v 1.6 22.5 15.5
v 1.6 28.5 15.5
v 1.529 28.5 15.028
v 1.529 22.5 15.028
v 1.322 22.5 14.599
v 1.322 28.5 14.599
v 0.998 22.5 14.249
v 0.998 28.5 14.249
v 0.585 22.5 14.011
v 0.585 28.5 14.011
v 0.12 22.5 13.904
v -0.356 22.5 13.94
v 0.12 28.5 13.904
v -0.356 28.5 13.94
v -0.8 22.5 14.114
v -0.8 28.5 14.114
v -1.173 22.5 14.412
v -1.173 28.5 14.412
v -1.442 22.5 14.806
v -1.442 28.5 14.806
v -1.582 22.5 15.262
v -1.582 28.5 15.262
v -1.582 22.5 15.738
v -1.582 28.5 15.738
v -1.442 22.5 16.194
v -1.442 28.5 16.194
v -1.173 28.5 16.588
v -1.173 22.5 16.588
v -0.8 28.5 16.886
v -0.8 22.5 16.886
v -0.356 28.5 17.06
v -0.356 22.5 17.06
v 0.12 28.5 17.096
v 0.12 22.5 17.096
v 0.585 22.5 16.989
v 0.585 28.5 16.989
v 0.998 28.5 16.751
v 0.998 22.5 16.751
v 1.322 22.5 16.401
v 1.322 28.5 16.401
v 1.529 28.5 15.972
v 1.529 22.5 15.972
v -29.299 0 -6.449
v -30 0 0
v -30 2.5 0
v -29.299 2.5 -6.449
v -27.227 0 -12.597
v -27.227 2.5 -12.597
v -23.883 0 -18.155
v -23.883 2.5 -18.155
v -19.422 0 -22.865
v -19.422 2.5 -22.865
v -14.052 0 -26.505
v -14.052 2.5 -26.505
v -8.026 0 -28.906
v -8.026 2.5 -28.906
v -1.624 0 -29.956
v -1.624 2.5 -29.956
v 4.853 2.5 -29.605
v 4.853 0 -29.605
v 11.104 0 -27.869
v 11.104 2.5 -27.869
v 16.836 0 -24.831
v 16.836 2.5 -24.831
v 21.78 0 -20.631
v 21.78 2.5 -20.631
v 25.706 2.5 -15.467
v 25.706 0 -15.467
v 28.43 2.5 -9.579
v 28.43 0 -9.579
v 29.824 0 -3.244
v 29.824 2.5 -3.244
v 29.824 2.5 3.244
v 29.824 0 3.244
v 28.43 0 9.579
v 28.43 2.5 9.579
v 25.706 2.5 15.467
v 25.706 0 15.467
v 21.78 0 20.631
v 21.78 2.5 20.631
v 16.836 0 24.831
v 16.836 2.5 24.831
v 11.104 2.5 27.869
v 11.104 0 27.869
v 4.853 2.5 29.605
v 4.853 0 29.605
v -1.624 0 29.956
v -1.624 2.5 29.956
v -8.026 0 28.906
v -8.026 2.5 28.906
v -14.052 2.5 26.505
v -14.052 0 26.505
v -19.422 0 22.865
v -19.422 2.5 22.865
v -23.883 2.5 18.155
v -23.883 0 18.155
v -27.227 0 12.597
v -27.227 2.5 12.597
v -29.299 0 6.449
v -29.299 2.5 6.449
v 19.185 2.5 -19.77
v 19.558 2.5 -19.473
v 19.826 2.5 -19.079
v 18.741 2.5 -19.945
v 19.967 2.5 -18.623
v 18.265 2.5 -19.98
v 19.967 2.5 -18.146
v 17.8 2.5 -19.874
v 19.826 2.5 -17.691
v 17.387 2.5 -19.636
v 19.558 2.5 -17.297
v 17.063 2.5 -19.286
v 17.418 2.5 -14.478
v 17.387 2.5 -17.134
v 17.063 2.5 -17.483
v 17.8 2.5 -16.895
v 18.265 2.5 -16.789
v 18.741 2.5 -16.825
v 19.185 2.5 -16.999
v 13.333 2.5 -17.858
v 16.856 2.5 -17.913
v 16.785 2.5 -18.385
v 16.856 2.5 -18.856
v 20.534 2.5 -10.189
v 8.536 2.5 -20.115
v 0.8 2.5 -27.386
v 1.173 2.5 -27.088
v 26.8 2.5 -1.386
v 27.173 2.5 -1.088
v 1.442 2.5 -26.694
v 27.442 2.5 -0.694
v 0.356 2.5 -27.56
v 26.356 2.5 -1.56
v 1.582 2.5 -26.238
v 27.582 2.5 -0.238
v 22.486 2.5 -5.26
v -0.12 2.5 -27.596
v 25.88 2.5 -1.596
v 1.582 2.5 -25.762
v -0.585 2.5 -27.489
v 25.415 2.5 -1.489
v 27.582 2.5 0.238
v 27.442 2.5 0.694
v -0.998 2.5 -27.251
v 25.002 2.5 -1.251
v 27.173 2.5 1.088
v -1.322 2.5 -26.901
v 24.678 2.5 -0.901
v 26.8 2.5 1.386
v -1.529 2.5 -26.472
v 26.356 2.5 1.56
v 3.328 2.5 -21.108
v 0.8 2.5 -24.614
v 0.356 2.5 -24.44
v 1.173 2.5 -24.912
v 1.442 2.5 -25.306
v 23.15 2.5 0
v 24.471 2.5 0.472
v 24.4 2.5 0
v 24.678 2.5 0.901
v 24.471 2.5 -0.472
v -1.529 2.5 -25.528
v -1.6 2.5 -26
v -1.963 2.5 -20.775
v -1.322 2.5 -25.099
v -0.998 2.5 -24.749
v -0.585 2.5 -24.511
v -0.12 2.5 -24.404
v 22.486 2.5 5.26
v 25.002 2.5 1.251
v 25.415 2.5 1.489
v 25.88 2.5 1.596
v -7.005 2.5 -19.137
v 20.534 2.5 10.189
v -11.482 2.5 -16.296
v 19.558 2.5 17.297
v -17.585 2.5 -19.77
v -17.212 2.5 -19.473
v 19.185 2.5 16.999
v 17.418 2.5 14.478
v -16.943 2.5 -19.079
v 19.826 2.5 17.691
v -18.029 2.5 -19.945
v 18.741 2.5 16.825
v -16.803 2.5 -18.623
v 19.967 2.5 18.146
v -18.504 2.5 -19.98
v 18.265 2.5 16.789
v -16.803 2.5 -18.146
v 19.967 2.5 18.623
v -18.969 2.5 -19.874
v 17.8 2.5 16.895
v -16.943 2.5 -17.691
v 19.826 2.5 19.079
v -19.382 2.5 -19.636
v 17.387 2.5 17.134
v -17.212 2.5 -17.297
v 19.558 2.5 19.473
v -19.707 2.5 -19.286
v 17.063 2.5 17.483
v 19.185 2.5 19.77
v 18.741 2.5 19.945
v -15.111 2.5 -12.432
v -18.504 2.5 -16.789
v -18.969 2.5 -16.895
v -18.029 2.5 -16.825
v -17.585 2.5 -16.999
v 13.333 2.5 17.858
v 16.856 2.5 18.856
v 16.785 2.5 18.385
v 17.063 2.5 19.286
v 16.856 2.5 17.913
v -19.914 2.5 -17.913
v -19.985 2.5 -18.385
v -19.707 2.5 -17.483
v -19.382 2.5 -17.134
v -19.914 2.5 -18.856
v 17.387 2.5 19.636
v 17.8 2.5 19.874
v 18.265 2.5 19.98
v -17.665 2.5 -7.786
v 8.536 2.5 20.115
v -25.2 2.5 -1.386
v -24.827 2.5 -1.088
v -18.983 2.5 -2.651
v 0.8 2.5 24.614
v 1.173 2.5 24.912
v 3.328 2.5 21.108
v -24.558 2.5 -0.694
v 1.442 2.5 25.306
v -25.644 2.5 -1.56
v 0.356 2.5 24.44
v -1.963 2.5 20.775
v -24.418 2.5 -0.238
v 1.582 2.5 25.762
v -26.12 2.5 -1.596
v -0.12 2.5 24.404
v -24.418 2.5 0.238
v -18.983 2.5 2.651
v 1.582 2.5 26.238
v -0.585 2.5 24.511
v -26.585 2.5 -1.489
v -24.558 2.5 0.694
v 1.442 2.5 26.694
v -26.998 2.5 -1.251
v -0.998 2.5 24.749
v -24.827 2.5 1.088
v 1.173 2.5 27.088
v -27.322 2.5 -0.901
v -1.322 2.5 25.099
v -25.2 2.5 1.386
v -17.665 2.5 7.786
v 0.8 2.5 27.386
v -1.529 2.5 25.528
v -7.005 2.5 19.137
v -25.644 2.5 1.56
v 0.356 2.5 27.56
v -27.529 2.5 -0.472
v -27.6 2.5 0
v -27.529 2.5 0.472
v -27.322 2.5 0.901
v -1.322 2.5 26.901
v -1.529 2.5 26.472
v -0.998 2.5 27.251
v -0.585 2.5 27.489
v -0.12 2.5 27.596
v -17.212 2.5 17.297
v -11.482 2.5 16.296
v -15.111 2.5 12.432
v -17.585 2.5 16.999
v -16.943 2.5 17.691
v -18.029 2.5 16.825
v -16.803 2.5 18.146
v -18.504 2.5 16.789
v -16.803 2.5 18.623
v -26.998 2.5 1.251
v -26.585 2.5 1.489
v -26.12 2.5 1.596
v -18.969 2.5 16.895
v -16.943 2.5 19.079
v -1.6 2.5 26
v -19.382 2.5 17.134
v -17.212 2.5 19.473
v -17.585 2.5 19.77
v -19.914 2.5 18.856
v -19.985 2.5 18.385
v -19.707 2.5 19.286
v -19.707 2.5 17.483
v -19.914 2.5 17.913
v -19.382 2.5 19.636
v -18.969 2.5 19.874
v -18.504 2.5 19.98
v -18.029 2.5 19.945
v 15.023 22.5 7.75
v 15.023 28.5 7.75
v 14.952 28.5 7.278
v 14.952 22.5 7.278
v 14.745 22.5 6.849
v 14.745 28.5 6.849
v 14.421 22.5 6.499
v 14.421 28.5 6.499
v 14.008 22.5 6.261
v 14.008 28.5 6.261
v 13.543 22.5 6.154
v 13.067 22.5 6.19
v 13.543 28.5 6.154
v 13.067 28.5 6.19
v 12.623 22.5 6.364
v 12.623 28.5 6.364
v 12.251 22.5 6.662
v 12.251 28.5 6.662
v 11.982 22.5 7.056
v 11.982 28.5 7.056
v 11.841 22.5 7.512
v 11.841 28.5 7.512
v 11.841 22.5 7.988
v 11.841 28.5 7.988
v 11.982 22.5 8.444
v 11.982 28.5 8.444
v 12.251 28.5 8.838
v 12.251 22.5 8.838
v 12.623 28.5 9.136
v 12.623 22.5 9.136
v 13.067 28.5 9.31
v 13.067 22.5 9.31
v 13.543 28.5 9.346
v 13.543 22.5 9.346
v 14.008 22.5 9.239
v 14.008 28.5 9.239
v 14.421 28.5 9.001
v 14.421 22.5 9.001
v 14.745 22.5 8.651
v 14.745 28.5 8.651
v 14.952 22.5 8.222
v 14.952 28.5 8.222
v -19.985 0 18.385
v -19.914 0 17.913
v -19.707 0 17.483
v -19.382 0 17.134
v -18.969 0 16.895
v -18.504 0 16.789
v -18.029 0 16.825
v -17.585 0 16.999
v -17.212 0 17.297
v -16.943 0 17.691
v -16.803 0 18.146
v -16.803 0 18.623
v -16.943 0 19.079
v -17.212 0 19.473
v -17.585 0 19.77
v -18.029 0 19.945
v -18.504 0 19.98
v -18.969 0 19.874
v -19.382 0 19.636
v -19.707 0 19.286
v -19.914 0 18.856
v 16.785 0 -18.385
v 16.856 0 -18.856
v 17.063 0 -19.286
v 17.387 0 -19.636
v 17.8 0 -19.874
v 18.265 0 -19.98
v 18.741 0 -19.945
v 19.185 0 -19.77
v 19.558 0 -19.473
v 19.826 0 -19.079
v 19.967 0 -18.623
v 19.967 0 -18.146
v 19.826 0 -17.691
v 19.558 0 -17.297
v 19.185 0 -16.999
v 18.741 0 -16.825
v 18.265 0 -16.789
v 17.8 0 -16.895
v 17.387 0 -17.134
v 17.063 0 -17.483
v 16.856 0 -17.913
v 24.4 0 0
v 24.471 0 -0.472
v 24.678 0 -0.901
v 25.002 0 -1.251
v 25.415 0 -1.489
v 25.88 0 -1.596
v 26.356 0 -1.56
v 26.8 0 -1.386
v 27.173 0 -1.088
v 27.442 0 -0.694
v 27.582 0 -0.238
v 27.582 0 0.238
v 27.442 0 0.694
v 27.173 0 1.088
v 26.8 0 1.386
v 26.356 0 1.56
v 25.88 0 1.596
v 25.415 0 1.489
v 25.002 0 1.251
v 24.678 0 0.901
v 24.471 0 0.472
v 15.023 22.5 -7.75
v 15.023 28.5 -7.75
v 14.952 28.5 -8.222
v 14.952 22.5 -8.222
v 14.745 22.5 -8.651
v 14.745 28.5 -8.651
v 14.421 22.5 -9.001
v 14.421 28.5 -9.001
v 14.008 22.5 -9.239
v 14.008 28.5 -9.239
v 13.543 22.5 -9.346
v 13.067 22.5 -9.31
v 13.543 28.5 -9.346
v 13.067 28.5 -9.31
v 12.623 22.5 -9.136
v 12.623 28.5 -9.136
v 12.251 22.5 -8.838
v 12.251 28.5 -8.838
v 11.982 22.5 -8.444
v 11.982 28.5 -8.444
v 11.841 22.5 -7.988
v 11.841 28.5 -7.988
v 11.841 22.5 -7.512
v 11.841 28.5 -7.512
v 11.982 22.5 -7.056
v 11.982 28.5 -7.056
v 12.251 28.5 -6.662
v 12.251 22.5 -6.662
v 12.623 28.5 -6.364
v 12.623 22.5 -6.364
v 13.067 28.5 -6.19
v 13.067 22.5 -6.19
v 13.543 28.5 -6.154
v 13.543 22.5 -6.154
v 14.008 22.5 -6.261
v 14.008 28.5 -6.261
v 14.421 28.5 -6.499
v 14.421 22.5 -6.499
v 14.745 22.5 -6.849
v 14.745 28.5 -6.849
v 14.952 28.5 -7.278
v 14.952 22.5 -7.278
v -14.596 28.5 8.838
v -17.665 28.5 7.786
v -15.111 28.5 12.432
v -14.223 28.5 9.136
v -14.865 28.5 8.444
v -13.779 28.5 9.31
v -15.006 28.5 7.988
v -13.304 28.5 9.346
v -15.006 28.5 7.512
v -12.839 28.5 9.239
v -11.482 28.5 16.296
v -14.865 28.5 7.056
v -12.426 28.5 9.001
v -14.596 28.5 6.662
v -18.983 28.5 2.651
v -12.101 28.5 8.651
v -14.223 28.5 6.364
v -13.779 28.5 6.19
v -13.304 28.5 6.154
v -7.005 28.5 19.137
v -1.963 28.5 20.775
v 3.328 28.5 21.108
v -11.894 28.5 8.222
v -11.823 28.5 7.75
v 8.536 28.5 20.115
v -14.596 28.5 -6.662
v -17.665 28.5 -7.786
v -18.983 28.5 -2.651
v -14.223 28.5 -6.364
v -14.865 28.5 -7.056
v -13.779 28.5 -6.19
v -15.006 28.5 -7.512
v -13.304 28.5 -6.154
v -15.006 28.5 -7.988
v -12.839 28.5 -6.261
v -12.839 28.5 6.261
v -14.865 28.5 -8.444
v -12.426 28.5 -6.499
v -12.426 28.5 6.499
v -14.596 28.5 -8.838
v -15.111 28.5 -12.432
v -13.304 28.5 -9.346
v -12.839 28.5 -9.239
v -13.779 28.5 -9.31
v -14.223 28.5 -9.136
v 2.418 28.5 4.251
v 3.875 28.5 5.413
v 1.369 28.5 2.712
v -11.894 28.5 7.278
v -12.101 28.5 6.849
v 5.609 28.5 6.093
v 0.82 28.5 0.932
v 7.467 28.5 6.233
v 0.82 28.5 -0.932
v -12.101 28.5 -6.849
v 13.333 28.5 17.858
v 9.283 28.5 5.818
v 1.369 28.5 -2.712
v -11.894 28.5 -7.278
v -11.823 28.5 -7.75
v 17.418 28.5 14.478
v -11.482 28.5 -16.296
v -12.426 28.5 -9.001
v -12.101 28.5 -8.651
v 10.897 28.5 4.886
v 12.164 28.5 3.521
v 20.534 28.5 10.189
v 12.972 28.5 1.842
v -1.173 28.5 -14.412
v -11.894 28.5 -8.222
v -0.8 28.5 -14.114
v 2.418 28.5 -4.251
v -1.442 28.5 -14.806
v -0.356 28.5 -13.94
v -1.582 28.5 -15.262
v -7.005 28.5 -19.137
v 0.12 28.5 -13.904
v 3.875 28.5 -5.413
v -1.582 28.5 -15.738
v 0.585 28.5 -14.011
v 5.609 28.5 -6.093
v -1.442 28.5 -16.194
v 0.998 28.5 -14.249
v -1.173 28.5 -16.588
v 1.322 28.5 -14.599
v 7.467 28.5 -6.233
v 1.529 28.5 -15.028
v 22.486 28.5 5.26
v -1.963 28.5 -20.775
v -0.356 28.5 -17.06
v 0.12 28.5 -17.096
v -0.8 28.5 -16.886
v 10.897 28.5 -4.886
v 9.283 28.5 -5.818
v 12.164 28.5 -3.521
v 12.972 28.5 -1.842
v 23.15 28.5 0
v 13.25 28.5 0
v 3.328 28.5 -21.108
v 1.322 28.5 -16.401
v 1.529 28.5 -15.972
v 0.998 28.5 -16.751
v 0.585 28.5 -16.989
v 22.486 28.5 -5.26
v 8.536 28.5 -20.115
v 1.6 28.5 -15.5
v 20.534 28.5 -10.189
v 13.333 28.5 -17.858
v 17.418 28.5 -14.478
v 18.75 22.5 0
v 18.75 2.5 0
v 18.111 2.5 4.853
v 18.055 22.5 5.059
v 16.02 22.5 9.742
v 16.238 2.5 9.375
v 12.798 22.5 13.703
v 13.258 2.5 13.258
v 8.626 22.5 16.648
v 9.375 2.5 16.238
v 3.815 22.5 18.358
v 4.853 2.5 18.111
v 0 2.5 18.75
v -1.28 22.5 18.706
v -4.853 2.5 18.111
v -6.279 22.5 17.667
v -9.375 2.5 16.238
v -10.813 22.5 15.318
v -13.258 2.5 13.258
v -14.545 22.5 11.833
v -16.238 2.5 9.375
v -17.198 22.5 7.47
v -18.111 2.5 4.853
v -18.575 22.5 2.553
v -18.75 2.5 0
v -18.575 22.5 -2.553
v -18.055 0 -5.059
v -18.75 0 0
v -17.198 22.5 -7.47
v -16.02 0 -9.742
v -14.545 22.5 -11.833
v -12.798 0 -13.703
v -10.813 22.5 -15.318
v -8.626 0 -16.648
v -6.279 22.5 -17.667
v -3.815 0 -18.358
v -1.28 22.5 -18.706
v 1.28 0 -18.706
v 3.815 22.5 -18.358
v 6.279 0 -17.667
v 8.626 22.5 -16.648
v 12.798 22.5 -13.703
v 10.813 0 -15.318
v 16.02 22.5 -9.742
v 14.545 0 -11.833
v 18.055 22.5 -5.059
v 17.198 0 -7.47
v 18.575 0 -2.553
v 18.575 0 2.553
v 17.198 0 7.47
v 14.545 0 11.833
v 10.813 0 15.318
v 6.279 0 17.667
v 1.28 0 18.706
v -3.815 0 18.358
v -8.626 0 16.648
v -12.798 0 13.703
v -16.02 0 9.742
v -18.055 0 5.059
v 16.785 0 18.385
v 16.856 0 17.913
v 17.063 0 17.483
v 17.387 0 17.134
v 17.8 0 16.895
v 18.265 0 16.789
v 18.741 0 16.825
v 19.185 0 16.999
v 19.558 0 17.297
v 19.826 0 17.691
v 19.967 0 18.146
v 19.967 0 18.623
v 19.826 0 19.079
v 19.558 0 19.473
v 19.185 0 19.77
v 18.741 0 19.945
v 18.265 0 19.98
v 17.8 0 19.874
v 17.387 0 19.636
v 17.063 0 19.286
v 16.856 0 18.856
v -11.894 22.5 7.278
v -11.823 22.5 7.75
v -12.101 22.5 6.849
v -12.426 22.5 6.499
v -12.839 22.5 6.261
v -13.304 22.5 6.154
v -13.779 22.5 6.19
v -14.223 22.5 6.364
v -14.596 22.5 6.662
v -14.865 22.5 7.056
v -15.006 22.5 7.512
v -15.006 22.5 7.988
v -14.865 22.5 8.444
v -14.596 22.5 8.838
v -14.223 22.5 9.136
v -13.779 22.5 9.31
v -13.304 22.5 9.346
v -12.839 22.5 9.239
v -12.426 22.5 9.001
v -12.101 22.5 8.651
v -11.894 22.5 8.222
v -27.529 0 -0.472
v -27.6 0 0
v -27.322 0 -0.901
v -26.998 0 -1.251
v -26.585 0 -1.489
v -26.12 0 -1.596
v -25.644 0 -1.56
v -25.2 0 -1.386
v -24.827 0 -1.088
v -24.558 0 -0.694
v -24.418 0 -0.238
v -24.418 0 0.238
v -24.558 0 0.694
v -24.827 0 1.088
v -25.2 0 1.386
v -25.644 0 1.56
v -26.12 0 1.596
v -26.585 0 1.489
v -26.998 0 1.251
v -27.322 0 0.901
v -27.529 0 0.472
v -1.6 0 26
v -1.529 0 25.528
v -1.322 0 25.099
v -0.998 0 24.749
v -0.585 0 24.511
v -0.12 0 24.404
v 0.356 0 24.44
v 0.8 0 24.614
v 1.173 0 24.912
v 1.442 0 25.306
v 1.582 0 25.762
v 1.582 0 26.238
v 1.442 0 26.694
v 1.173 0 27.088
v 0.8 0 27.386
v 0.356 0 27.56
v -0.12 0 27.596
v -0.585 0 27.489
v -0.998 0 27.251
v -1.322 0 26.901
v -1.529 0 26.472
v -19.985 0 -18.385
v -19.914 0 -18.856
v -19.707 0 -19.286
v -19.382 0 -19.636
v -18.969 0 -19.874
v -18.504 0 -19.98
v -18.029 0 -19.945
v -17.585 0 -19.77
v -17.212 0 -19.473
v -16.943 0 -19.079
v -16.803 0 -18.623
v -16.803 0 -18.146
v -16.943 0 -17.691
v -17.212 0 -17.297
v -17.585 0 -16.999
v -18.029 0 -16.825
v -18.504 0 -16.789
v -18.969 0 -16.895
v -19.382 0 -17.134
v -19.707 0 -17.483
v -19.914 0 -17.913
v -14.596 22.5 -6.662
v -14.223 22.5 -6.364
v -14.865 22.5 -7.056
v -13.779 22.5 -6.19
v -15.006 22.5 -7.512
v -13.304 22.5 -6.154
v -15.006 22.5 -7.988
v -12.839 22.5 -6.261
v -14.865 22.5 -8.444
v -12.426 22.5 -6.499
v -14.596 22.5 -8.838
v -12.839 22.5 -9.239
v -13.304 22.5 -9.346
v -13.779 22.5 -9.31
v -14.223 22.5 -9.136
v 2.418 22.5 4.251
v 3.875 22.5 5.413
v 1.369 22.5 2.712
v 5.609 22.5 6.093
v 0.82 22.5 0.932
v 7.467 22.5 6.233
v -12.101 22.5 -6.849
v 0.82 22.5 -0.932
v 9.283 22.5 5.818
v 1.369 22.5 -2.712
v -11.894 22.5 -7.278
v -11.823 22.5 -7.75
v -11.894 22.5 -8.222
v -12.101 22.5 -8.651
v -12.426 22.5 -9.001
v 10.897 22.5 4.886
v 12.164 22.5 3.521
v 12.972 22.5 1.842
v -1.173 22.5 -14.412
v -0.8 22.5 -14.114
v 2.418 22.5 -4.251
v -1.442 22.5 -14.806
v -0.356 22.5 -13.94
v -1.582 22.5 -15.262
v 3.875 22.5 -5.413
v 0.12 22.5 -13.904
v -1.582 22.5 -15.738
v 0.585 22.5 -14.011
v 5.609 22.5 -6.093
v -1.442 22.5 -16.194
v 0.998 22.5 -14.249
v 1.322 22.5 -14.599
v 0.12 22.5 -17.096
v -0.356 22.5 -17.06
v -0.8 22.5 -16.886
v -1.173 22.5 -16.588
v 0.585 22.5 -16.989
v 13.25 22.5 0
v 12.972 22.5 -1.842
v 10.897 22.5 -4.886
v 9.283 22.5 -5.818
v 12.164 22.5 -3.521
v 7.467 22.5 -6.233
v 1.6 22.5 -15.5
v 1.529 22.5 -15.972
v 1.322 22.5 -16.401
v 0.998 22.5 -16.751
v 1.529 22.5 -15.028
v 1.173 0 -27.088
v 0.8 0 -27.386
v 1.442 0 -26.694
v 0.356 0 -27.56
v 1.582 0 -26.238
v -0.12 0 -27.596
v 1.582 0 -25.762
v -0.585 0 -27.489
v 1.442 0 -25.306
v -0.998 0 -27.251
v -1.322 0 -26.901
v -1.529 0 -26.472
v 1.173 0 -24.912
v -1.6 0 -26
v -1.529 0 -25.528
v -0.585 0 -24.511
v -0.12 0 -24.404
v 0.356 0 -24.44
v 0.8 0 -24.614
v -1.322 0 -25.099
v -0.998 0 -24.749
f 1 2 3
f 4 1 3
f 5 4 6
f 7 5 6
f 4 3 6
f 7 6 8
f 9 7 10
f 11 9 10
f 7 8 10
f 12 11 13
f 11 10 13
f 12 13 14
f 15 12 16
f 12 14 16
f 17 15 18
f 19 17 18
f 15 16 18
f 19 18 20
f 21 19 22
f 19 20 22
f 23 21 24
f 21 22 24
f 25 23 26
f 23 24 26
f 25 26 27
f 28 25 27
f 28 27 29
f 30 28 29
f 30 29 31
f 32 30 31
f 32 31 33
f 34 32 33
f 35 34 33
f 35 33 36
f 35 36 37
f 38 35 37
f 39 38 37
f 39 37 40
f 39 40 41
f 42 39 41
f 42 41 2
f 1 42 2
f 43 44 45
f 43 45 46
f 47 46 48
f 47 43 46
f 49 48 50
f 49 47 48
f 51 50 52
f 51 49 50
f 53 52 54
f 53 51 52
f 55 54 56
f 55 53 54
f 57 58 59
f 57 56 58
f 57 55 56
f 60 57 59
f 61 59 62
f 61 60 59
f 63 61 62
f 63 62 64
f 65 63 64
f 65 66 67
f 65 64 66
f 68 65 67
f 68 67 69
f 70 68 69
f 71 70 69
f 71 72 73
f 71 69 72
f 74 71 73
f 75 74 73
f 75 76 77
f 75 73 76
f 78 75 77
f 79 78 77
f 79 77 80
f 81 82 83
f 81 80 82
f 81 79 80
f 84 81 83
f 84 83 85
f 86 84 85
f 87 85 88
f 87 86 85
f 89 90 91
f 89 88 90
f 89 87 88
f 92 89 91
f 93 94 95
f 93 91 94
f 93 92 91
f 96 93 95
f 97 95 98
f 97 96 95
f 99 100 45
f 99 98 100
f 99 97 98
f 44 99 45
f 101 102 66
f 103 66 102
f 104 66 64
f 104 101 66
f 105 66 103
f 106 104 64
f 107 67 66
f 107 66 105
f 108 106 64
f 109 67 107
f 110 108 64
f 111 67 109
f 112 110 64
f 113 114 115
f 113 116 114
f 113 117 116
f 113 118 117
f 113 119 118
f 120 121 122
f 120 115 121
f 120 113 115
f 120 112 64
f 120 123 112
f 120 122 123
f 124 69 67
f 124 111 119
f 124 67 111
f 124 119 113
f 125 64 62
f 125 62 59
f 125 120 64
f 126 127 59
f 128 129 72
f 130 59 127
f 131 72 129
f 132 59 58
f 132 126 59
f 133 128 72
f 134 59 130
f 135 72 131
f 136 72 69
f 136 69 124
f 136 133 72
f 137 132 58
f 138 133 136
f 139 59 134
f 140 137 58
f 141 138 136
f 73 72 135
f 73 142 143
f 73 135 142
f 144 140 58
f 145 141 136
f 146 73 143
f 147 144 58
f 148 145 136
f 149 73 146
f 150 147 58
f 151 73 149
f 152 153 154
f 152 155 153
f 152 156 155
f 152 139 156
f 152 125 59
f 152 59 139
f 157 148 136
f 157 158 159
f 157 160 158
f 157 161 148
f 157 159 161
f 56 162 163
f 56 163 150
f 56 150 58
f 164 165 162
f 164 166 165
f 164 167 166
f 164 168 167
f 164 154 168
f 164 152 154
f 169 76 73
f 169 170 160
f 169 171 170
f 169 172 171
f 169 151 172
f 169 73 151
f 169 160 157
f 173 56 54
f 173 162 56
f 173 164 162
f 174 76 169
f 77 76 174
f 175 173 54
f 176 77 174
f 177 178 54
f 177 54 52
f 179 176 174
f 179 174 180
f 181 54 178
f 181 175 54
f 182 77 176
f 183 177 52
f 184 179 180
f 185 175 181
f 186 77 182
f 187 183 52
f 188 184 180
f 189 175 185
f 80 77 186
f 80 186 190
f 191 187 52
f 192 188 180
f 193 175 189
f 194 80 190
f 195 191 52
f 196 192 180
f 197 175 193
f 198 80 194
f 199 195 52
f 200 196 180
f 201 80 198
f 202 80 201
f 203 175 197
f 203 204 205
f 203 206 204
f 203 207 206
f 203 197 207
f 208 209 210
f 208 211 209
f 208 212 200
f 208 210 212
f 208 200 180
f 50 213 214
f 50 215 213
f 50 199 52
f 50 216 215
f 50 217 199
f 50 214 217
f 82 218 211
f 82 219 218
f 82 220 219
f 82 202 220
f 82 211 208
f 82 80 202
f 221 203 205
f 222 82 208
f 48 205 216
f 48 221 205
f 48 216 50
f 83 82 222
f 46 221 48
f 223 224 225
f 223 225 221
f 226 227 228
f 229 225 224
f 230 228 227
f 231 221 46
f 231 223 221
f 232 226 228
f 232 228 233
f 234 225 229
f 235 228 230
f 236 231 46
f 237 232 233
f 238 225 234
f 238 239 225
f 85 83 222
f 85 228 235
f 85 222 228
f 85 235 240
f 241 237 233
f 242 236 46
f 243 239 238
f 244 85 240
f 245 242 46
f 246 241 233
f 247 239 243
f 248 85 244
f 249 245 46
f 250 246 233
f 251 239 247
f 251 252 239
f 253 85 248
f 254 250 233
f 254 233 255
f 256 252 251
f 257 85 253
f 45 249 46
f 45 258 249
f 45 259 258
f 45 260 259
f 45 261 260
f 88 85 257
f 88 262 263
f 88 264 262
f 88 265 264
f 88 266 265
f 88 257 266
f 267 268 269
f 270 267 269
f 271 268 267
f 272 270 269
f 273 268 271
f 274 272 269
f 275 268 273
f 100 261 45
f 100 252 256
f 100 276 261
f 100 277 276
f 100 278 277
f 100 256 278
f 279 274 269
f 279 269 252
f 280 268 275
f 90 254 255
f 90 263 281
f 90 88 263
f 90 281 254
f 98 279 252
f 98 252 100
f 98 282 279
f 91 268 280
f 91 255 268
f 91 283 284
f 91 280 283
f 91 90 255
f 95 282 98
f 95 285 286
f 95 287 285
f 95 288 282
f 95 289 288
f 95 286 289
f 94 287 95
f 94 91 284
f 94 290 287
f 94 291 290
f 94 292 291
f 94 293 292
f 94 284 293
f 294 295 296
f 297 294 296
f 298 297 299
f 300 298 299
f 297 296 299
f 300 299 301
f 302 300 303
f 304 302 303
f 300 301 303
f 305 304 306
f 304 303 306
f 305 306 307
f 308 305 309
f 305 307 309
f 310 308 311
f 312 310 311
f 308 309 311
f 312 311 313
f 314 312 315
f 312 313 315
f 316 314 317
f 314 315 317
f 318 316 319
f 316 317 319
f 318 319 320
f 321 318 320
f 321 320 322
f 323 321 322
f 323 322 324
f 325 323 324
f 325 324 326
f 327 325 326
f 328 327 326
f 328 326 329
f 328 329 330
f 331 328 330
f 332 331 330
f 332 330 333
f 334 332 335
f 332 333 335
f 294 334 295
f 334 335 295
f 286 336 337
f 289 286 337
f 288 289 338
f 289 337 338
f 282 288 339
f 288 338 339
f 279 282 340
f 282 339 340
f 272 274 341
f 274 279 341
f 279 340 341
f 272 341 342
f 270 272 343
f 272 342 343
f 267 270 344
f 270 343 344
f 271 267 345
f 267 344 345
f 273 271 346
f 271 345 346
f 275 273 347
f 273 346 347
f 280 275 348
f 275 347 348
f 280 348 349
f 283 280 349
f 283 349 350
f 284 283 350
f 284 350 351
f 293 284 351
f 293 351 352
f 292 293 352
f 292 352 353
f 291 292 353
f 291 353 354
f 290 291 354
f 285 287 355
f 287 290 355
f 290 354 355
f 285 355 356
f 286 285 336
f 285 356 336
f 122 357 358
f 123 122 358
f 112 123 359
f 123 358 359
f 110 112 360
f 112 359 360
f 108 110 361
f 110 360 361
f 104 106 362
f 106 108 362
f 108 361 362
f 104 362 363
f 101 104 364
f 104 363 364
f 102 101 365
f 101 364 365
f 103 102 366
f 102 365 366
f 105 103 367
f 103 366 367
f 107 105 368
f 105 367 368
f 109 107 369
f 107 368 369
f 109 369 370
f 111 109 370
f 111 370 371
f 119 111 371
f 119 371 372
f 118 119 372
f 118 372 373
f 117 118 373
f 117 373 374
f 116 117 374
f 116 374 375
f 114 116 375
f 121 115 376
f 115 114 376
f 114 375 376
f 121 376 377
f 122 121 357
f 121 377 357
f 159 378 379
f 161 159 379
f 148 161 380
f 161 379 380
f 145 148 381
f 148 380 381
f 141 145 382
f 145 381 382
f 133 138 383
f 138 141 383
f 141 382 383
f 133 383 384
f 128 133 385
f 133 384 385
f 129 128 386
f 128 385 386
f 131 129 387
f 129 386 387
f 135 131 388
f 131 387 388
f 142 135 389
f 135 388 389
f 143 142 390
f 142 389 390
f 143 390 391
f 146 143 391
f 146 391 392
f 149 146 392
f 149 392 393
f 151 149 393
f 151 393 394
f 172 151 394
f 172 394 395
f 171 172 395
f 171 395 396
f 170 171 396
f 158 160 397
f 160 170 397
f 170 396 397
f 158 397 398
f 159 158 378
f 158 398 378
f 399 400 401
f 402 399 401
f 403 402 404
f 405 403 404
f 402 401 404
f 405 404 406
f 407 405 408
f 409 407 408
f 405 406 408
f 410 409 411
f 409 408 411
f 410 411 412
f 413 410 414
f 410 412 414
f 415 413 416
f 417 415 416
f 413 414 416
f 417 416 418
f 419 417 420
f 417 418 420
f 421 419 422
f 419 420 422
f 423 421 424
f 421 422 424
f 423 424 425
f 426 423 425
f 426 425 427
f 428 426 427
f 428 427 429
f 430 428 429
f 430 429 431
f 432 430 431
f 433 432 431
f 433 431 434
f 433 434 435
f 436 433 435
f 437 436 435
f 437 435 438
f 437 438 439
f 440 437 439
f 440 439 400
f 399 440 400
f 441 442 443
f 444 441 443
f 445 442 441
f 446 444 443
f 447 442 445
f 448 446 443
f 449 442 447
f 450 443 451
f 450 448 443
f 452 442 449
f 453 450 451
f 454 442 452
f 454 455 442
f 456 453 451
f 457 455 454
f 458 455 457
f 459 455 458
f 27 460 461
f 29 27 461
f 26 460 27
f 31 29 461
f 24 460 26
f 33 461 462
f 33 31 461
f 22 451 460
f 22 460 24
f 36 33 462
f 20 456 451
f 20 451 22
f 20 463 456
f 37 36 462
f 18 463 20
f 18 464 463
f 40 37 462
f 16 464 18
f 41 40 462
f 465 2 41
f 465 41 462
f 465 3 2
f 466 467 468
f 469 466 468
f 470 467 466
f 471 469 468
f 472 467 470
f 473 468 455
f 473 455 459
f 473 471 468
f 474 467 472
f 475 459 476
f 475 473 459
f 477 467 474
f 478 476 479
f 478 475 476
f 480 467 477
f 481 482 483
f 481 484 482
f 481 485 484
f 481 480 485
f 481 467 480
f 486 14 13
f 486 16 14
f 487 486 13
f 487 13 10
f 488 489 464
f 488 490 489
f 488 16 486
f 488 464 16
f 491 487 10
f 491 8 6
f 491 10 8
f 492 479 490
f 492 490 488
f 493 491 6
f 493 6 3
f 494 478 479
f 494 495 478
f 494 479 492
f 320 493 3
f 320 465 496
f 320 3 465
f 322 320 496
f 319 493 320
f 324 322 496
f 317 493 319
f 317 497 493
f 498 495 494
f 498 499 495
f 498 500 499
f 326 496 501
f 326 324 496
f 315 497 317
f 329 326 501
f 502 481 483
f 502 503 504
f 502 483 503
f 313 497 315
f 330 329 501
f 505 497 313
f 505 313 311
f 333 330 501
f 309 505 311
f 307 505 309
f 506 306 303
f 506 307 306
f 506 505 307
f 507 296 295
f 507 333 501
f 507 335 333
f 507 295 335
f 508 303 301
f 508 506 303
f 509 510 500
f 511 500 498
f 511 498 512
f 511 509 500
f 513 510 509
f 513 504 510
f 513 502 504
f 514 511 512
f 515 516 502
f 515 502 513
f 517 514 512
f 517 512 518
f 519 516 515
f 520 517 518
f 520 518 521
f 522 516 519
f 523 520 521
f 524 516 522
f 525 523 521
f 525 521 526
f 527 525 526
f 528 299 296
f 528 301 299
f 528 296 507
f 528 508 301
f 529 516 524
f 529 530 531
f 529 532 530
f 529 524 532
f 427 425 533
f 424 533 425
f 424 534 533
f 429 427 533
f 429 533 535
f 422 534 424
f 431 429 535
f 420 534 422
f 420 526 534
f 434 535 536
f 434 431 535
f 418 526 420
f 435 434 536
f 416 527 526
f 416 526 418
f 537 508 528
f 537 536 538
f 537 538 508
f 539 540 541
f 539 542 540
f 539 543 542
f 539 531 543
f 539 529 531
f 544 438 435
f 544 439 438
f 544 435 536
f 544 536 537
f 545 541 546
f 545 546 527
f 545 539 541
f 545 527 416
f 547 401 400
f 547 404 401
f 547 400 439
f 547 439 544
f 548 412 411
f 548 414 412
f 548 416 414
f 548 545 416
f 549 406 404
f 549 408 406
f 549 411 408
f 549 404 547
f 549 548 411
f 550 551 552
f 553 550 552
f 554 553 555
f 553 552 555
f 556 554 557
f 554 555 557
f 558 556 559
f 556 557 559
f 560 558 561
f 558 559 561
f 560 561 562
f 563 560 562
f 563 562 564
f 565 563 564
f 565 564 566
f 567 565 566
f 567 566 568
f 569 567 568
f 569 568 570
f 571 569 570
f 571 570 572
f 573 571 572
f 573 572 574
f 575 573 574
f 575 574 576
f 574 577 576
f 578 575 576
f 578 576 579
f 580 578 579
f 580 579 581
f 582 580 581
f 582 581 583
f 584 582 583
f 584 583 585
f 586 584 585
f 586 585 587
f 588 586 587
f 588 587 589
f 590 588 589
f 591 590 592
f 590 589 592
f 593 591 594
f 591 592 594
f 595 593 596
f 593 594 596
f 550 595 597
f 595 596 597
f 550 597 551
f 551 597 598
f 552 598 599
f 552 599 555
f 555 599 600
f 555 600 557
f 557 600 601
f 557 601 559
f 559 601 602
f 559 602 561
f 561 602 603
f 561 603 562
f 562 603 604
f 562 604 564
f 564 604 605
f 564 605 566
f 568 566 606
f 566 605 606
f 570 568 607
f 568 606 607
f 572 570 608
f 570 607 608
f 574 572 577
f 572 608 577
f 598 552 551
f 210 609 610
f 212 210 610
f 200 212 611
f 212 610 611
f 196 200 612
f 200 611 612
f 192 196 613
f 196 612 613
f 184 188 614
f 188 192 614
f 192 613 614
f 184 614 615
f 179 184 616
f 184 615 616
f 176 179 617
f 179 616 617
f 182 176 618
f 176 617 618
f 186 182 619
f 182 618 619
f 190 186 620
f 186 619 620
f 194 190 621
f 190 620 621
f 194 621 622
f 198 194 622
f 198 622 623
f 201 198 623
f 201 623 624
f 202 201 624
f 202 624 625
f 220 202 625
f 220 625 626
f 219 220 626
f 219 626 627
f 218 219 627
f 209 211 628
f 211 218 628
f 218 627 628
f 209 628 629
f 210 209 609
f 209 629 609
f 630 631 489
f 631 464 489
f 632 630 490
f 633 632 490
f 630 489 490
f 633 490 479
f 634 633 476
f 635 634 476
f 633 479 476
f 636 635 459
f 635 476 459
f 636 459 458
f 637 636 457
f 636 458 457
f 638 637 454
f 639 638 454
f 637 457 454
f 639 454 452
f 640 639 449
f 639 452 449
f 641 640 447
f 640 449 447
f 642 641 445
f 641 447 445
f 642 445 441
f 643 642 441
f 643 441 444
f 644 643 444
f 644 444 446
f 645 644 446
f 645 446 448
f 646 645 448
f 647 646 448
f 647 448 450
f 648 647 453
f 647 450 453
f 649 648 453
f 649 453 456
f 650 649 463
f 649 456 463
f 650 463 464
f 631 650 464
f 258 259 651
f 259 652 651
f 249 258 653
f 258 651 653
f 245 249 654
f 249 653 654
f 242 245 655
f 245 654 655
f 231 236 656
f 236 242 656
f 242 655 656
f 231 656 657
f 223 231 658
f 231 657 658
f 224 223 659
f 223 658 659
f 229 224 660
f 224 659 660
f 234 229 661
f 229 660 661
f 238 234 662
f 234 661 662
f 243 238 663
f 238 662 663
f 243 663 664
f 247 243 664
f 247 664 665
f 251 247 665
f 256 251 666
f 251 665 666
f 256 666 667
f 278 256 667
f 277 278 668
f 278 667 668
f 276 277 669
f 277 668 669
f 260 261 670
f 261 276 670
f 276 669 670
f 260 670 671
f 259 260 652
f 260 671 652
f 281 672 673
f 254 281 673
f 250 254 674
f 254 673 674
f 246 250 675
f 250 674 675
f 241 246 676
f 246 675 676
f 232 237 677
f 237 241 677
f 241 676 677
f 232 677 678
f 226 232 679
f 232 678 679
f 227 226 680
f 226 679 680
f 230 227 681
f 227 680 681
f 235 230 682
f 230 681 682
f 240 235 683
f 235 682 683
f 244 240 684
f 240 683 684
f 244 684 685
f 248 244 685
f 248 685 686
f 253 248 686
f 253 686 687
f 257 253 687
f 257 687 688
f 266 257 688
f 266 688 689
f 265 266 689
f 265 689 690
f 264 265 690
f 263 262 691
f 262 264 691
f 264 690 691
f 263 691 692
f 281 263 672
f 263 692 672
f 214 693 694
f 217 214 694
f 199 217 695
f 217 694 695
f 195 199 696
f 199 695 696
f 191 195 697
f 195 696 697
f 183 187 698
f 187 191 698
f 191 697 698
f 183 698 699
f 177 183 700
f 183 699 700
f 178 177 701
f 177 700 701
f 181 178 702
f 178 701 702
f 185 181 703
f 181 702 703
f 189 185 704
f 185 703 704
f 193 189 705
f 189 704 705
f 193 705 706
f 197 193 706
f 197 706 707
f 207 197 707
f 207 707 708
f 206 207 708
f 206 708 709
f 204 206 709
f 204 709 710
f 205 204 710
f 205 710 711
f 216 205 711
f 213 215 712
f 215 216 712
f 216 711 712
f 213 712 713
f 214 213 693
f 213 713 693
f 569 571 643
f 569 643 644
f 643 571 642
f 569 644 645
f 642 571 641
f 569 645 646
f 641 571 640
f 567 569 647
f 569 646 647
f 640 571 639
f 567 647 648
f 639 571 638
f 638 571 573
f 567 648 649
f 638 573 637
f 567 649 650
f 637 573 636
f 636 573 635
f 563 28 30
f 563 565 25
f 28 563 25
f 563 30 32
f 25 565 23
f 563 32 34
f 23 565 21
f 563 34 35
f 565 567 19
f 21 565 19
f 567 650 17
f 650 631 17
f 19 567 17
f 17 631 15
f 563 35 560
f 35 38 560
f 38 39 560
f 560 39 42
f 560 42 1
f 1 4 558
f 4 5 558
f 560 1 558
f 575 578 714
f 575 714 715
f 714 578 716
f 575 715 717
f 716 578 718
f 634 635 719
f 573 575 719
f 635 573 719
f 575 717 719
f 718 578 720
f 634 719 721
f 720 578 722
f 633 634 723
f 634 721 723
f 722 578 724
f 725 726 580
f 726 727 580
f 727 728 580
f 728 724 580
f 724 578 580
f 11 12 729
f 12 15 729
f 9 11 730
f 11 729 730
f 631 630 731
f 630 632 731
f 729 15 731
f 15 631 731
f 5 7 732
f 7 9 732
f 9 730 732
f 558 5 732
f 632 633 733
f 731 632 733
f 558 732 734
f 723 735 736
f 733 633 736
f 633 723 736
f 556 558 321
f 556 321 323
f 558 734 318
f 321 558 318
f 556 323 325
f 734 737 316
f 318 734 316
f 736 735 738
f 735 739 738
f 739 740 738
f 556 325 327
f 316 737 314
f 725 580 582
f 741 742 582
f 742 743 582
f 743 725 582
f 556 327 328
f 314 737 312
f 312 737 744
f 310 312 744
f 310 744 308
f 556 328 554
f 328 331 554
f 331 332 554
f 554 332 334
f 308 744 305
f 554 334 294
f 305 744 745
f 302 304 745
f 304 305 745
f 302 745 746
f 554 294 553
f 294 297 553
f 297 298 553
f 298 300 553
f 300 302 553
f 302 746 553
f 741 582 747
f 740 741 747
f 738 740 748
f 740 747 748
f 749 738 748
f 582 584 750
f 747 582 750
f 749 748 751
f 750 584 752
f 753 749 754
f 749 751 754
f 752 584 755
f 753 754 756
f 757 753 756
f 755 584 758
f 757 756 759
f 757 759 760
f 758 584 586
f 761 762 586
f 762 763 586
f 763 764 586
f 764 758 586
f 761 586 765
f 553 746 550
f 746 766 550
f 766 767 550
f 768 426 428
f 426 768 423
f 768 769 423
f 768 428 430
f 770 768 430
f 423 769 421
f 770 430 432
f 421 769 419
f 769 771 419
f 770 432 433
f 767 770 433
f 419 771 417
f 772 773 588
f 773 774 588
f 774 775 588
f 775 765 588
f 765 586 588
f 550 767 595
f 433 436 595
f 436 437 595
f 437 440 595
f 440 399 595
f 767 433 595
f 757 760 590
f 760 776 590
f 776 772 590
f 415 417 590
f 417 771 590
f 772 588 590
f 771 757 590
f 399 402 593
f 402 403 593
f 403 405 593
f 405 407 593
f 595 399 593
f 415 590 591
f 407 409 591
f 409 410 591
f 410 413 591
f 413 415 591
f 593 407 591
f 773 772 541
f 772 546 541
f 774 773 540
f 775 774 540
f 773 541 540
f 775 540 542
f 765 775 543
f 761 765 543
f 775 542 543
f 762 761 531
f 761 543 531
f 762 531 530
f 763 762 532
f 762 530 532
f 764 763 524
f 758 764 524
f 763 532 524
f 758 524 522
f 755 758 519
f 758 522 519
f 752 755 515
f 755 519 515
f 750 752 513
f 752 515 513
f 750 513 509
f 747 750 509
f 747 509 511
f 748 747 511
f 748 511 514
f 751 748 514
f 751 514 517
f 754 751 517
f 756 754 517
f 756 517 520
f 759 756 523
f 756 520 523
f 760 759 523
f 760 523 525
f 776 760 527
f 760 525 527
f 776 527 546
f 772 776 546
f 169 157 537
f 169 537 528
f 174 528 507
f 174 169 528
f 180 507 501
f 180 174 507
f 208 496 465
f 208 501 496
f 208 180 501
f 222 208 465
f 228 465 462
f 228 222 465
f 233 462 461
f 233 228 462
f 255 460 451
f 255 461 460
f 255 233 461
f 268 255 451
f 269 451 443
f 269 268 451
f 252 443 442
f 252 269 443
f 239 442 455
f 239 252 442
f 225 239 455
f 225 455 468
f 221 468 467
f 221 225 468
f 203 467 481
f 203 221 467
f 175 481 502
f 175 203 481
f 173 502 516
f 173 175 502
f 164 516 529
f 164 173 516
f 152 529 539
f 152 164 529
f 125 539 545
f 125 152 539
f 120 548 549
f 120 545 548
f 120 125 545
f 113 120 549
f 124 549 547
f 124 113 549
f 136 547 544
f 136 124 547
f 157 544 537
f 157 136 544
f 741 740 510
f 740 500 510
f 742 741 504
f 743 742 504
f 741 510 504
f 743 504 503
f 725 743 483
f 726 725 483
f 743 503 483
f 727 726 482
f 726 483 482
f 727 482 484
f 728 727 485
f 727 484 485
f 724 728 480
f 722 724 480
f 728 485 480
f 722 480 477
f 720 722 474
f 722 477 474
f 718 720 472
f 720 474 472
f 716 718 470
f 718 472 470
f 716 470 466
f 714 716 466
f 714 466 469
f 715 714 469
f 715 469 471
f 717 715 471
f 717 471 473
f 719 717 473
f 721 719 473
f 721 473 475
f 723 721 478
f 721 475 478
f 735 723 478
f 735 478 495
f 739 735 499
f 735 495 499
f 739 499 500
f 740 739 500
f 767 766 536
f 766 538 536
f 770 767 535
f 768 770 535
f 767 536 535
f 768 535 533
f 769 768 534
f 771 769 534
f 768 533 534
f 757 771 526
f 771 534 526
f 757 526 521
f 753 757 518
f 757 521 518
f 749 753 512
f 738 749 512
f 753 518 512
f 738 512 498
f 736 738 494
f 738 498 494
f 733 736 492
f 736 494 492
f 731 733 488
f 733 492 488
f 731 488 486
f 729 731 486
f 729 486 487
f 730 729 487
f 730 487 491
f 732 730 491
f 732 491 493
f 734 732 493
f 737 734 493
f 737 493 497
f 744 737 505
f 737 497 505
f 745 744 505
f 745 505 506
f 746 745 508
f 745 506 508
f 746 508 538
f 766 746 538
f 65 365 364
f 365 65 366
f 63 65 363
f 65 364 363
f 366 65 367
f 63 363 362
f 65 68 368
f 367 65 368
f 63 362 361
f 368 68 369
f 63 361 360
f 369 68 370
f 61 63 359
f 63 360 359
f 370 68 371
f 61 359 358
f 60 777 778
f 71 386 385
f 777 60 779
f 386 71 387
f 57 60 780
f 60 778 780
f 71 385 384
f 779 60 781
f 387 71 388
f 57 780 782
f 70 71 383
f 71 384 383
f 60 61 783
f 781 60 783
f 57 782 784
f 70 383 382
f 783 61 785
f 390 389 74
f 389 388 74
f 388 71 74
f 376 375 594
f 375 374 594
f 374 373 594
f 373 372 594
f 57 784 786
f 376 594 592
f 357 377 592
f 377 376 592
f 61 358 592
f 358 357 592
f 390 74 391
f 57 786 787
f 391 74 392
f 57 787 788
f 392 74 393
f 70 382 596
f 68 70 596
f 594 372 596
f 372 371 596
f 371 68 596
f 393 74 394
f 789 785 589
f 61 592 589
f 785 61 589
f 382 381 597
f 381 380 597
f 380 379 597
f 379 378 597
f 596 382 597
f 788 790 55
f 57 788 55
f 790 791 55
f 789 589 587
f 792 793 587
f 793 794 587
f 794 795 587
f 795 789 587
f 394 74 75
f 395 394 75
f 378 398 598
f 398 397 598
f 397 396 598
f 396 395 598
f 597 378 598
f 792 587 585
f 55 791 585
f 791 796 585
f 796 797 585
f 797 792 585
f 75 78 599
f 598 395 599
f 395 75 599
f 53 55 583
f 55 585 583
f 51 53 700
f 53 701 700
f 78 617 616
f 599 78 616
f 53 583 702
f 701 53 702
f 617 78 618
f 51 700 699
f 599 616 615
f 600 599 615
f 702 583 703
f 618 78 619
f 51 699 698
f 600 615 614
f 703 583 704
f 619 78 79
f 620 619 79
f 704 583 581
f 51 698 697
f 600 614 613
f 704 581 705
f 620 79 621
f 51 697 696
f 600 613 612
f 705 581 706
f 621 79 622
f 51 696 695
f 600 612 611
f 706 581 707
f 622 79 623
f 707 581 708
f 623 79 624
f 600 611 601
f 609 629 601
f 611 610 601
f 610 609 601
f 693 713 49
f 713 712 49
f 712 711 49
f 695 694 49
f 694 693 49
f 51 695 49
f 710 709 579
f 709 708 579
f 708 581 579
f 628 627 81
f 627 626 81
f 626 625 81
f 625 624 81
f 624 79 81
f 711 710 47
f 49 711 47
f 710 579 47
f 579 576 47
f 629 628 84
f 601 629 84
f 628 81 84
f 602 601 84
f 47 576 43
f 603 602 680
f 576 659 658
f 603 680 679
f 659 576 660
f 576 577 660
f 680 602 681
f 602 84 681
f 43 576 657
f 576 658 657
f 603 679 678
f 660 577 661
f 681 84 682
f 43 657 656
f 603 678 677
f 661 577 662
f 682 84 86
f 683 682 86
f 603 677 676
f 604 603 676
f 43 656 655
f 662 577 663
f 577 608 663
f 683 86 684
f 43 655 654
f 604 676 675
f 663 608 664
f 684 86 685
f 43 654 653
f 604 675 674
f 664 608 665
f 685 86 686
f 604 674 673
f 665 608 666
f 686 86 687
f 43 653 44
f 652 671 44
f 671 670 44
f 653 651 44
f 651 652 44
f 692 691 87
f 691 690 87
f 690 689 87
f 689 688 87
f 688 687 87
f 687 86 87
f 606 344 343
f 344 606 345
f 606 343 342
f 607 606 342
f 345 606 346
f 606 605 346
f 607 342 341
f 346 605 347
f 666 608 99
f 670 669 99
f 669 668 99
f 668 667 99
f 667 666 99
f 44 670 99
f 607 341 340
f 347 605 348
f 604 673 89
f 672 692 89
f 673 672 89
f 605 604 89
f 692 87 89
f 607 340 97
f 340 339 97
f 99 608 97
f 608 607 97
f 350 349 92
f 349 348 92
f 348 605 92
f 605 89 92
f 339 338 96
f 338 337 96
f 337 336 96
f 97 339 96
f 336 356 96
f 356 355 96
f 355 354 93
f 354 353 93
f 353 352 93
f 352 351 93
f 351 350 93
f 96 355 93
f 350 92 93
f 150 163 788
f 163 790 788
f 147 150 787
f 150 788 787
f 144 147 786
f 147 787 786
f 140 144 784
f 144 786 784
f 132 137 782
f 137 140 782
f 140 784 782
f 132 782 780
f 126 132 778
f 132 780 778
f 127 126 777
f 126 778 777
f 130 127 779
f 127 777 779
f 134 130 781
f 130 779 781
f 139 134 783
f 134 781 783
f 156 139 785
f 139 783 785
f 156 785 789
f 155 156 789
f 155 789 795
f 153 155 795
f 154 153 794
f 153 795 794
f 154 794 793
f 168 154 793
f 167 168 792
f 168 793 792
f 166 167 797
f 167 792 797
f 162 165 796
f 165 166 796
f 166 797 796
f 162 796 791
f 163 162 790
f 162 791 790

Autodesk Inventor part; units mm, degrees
ref_plane "YZ Plane" through (0, 0, 0) normal (1, 0, 0) x (0, 1, 0)
ref_plane "XZ Plane" through (0, 0, 0) normal (0, 1, 0) x (-1, 0, 0)
ref_plane "XY Plane" through (0, 0, 0) normal (0, 0, 1) x (1, 0, 0)
sketch "Sketch2" plane through (0, 0, 0) normal (0, 1, 0) x (-1, 0, 0)
  circle A0 centre (0, 0) radius 18.75
  circle A1 centre (0, 0) radius 30
  circle A2 centre (26, 0) radius 1.6
  circle A3 centre (18.3848, -18.3848) radius 1.6
  circle A4 centre (0, -26) radius 1.6
  circle A5 centre (-18.3848, -18.3848) radius 1.6
  circle A6 centre (-26, 0) radius 1.6
  circle A7 centre (-18.3848, 18.3848) radius 1.6
  circle A8 centre (0, 26) radius 1.6
  circle A9 centre (18.3848, 18.3848) radius 1.6
  dimension "motorDiameter" = 37.5
  dimension "motorFixtureDiameter" = 60
  dimension "d20" = 3.2
  dimension "d21" = 26
  dimension "d24" = 0
  dimension "d27" = 360
extrude "Extrusion2" add sketch "Sketch2" along normal blind 2.5
sketch "Sketch3" plane through (0, 2.5, 0) normal (0, 1, 0) x (1, 0, 0)
  circle A0 centre (2, 0) radius 21.15
  circle A1 centre (0, 0) radius 18.75
  dimension "d31" = 2
  dimension "d32" = 42.3
  dimension "d33" = 37.5
  dimension "d34" = 0
extrude "Extrusion3" add sketch "Sketch3" along normal blind 20
sketch "Sketch4" plane through (2, 22.5, 0) normal (0, 1, 0) x (1, 0, 0)
  circle A0 centre (0, 0) radius 21.15 projected
  circle A1 centre (0, 0) radius 21.15
extrude "Extrusion4" add sketch "Sketch4" along normal blind 6
sketch "Sketch5" plane through (2, 28.5, 0) normal (0, 1, 0) x (1, 0, 0)
  circle A0 centre (-2, 0) radius 18.75 projected
  circle A1 centre (0, 0) radius 21.15 projected
  circle A2 centre (0, 0) radius 21.15 projected
  circle A3 centre (5, 0) radius 6.25
  circle A4 centre (-2, 15.5) radius 1.6
  circle A5 centre (-15.4234, 7.75) radius 1.6
  circle A6 centre (-15.4234, -7.75) radius 1.6
  circle A7 centre (-2, -15.5) radius 1.6
  circle A8 centre (11.4234, -7.75) radius 1.6
  circle A9 centre (11.4234, 7.75) radius 1.6
  dimension "d39" = 12.5
  dimension "d40" = 0
  dimension "d43" = 3.2
  dimension "d44" = 0
  dimension "d45" = 15.5
  dimension "d48" = 360
  dimension "d52" = 7
extrude "Extrusion5" cut sketch "Sketch5" against normal up to next contours A3 | A4 | A5 | A6 | A7 | A8 | A9
equation "\"d33\" = motorDiameter"
properties part number "motor fixture" material "ABS Plastic"
